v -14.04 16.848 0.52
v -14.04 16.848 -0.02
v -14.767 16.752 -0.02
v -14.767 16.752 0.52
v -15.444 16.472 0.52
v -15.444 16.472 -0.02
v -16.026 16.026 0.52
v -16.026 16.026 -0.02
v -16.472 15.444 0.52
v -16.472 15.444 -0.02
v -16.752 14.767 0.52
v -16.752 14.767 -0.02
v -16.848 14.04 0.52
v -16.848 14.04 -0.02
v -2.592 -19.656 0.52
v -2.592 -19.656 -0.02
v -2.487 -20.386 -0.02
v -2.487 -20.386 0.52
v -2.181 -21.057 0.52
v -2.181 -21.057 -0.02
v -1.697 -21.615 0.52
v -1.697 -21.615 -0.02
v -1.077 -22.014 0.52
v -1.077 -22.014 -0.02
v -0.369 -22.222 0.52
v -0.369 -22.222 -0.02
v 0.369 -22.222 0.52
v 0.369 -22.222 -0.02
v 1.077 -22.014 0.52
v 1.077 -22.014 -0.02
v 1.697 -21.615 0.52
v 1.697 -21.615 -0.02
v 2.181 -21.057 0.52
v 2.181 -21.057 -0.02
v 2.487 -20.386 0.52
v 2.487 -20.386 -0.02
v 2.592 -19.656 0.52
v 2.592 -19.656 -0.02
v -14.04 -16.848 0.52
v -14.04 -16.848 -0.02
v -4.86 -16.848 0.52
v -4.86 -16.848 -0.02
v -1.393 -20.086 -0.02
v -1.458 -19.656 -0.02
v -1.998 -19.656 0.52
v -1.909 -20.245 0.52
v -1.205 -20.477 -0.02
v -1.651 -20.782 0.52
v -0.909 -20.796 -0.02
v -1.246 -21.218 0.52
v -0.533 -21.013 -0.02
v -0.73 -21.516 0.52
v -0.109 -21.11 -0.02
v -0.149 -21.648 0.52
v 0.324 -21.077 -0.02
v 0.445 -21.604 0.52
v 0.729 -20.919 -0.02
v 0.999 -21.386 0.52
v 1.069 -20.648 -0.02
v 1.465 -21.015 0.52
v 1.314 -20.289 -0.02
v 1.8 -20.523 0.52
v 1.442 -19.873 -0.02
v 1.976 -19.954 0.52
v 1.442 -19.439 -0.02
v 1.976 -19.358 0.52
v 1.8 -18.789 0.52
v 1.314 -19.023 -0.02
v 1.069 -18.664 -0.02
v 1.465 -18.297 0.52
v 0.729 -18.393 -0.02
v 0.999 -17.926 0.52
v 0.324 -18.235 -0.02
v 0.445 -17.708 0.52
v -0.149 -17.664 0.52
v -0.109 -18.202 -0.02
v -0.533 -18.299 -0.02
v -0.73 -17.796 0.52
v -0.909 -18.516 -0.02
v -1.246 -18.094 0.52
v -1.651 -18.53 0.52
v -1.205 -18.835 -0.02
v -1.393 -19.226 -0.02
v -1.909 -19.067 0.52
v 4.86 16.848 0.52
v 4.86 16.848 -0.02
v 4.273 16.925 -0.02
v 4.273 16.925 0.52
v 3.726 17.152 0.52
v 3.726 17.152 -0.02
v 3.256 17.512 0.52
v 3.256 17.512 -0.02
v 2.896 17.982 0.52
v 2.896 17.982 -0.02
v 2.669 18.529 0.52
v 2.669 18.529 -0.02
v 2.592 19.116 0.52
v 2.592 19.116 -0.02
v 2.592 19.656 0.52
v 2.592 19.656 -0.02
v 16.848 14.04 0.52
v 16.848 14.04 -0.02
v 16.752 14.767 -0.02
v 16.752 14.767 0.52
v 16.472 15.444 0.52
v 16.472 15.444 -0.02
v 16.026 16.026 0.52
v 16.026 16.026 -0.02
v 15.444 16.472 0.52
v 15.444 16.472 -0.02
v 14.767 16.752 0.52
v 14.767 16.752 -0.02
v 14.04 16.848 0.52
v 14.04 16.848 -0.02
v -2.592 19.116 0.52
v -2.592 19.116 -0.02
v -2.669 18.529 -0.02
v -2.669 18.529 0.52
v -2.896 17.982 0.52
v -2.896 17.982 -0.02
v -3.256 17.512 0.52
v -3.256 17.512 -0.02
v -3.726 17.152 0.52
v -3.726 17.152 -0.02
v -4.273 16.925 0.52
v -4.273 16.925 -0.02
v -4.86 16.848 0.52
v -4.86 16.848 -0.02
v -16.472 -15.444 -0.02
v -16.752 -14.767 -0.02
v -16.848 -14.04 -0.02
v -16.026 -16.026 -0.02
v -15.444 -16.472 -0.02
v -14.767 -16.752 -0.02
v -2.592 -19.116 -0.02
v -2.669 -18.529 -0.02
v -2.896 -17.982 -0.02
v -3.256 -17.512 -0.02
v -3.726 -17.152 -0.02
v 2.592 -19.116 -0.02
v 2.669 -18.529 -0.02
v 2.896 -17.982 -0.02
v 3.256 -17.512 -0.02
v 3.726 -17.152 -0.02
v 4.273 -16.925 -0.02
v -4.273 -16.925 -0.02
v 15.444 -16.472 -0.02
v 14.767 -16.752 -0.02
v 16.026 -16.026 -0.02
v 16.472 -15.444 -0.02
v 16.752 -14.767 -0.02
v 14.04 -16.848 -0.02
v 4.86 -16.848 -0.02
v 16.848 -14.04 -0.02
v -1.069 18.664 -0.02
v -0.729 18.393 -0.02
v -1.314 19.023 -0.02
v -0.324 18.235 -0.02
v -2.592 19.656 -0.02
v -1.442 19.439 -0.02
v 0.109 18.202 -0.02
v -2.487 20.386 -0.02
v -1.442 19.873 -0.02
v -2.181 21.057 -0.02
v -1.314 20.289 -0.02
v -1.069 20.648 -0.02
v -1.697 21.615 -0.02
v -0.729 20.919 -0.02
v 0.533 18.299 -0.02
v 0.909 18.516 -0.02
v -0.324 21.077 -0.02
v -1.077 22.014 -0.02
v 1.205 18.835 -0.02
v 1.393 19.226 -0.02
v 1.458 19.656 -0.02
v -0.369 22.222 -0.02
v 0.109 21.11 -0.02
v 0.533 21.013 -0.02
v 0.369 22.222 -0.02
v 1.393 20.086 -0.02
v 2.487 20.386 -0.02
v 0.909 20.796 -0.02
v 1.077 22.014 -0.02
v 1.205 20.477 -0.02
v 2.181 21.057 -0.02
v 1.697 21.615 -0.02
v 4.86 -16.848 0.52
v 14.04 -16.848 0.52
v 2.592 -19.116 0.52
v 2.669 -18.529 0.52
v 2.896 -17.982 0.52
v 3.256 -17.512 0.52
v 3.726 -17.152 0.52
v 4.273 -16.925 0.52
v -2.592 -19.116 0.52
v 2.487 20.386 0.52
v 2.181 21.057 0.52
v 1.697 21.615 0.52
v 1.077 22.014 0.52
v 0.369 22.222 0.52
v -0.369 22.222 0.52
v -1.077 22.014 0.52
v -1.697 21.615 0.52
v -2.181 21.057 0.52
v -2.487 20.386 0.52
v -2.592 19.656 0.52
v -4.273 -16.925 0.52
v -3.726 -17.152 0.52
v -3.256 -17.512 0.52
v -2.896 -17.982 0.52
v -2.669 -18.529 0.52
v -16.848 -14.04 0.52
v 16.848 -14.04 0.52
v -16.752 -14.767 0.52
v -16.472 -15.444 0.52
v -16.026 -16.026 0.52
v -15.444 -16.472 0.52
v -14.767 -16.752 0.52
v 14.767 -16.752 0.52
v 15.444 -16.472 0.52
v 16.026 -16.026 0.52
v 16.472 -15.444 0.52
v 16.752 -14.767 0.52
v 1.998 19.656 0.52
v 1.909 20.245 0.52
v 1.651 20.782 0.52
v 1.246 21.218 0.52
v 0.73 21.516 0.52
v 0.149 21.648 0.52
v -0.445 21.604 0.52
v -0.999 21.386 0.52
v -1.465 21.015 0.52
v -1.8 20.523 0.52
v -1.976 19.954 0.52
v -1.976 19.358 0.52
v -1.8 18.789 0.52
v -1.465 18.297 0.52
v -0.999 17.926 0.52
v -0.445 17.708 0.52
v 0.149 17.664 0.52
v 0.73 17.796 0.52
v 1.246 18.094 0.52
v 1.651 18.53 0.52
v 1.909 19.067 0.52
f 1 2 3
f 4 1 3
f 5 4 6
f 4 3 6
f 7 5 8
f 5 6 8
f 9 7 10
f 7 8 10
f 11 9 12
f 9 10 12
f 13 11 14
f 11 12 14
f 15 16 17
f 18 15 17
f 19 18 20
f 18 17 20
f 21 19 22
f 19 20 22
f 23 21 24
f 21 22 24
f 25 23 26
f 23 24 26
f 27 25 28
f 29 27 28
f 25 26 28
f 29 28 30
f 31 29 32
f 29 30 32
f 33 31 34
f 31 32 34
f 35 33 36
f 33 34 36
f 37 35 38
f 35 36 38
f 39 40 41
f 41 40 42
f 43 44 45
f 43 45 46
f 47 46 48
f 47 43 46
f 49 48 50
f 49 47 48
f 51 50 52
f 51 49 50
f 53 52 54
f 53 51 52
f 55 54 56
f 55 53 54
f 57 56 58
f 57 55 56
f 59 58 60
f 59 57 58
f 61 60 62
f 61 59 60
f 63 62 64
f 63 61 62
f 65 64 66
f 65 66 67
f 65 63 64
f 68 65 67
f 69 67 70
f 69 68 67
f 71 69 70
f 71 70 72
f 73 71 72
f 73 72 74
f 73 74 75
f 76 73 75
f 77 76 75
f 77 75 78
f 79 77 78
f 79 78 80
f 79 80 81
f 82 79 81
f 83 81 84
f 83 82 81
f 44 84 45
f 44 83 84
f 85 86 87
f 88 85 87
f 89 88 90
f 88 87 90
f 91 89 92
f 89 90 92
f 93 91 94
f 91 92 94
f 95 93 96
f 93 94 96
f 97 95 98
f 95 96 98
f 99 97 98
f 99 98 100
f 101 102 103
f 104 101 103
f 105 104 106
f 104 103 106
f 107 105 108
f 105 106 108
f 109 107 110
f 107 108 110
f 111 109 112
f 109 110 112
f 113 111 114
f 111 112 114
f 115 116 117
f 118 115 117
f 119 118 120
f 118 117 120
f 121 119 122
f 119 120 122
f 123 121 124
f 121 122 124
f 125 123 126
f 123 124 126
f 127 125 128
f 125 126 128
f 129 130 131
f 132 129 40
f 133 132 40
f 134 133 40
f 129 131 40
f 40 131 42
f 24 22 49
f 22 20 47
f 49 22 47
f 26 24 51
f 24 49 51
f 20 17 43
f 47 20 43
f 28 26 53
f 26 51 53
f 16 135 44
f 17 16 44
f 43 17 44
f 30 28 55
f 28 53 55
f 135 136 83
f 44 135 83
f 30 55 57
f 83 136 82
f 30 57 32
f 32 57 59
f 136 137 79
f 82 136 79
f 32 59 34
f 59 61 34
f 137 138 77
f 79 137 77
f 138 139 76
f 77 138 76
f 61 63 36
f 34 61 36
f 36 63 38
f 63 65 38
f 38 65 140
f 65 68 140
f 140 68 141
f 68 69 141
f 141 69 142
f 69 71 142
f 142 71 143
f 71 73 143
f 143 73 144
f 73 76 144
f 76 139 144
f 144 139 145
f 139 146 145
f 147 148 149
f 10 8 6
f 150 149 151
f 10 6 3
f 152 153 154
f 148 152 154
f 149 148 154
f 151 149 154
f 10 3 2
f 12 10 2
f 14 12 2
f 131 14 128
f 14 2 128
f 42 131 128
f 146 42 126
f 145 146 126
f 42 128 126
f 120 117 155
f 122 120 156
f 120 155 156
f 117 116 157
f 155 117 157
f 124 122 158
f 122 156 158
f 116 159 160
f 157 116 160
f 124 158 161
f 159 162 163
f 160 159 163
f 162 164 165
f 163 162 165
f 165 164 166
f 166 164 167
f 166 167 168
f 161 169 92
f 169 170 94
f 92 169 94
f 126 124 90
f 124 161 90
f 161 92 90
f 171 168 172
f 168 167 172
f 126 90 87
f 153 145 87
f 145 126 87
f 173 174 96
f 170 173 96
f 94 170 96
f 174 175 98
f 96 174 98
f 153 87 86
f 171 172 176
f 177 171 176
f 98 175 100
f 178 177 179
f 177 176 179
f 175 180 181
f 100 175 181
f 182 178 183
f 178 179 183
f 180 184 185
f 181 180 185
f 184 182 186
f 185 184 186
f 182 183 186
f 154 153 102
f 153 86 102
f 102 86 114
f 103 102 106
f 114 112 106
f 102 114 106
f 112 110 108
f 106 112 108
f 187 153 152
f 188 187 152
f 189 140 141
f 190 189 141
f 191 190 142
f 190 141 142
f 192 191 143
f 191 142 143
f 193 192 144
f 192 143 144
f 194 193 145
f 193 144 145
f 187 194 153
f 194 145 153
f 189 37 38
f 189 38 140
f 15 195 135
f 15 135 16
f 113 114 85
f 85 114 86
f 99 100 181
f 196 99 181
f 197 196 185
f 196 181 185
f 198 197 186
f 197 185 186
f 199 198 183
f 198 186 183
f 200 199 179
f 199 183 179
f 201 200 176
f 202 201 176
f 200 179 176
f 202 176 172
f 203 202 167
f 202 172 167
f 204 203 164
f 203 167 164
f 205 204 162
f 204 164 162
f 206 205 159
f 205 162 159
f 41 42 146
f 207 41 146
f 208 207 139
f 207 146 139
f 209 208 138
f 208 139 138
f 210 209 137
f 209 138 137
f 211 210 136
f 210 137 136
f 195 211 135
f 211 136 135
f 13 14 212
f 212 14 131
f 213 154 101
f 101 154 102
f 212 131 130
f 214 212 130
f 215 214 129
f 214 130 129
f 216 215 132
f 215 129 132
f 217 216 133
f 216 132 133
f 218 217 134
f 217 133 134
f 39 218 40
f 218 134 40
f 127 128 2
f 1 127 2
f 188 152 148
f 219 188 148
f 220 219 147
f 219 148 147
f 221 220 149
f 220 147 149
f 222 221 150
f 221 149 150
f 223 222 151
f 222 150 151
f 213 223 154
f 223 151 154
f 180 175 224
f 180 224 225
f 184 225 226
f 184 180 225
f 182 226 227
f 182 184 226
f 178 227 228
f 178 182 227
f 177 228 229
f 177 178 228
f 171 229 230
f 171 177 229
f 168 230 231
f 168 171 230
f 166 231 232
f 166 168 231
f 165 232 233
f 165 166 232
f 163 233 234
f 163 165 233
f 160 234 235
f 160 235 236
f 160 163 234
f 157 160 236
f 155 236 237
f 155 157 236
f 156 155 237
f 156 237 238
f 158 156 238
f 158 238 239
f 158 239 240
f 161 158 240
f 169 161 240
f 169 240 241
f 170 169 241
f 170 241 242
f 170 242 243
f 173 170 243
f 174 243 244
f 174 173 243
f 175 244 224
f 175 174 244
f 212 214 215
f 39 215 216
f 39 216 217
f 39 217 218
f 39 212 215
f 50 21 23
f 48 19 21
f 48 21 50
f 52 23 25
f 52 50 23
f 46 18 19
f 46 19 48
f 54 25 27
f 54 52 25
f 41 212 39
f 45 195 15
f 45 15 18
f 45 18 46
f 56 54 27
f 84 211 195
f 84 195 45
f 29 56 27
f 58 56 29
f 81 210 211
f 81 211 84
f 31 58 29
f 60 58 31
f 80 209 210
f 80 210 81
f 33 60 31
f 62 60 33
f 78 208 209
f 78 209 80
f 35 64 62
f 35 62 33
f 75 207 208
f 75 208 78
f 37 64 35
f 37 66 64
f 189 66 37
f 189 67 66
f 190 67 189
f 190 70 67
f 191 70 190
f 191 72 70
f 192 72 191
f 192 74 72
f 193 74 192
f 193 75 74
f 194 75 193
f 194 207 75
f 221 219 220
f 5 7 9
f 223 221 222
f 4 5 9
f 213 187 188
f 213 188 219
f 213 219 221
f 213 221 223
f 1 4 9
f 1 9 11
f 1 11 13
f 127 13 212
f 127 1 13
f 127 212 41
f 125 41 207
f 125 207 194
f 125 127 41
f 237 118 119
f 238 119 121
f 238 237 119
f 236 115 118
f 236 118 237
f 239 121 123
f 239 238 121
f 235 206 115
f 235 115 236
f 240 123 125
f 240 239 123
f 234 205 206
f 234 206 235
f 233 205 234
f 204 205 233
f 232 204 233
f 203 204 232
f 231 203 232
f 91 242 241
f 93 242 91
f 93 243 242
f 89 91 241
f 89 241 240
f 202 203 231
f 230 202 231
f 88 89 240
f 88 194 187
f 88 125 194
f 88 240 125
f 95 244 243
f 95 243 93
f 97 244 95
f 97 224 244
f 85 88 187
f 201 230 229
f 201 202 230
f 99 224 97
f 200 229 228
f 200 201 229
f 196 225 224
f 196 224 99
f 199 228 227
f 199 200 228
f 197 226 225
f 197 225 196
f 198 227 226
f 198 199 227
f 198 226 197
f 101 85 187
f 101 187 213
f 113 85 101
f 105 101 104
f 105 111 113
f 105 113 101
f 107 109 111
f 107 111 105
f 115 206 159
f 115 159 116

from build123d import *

# Parameters (mm, degrees)
SKETCH_1_R      = 1
EXTRUDE_1_DEPTH = 0.5
CHAMFER_1_SIZE  = 0.85
SCALE_1_SCALE   = 1.08


with BuildPart() as part:
    # Эскиз1 → Бобышка-Вытянуть1 (new body)
    with BuildSketch(Plane.XY):
        with BuildLine():
            Line((-15.6, 13), (-15.6, -13))
            ThreePointArc((-15.6, -13), (-14.838477631, -14.838477631), (-13, -15.6))
            Line((-13, -15.6), (-12.5, -15.6))
            Line((-12.5, -15.6), (-4.5, -15.6))
            ThreePointArc((-4.5, -15.6), (-3.01507576, -16.21507576), (-2.4, -17.7))
            Line((-2.4, -17.7), (-2.4, -18.2))
            ThreePointArc((-2.4, -18.2), (0, -20.6), (2.4, -18.2))
            Line((2.4, -18.2), (2.4, -17.7))
            ThreePointArc((2.4, -17.7), (3.01507576, -16.21507576), (4.5, -15.6))
            Line((4.5, -15.6), (12.5, -15.6))
            Line((12.5, -15.6), (13, -15.6))
            ThreePointArc((13, -15.6), (14.838477631, -14.838477631), (15.6, -13))
            Line((15.6, -13), (15.6, 13))
            ThreePointArc((15.6, 13), (14.838477631, 14.838477631), (13, 15.6))
            Line((13, 15.6), (12.5, 15.6))
            Line((12.5, 15.6), (4.5, 15.6))
            ThreePointArc((4.5, 15.6), (3.01507576, 16.21507576), (2.4, 17.7))
            Line((2.4, 17.7), (2.4, 18.2))
            ThreePointArc((2.4, 18.2), (0, 20.6), (-2.4, 18.2))
            Line((-2.4, 18.2), (-2.4, 17.7))
            ThreePointArc((-2.4, 17.7), (-3.01507576, 16.21507576), (-4.5, 15.6))
            Line((-4.5, 15.6), (-12.5, 15.6))
            Line((-12.5, 15.6), (-13, 15.6))
            ThreePointArc((-13, 15.6), (-14.838477631, 14.838477631), (-15.6, 13))
        make_face()
        with Locations((0, 18.2)):
            Circle(SKETCH_1_R, mode=Mode.SUBTRACT)
        with Locations(Location((0, -18.2, 0), (0, 0, 180))):
            Circle(SKETCH_1_R, mode=Mode.SUBTRACT)
    extrude(amount=EXTRUDE_1_DEPTH)

    # Фаска1
    # the kernel refuses this chamfer: 0.85 mm, written as the material it takes off along each edge
    with BuildSketch(Plane(origin=(0, -18.2, 0.5), x_dir=(-1, 0, 0), z_dir=(0, 1, 0))) as chamfer_1_piece_1:
        Polygon((1 + CHAMFER_1_SIZE, 0), (1, -CHAMFER_1_SIZE), (1, 0), align=None)
    revolve(axis=Axis((0, -18.2, 0.5), (0, 0, 1)), mode=Mode.SUBTRACT)
    with BuildSketch(Plane(origin=(0, 18.2, 0.5), x_dir=(1, 0, 0), z_dir=(0, -1, 0))) as chamfer_1_piece_2:
        Polygon((1 + CHAMFER_1_SIZE, 0), (1, -CHAMFER_1_SIZE), (1, 0), align=None)
    revolve(axis=Axis((0, 18.2, 0.5), (0, 0, 1)), mode=Mode.SUBTRACT)


with BuildPart() as part_1:
    # Масштаб1: scaled about (0, 0, 0.249580392)
    add(part.part.scale(SCALE_1_SCALE).moved(Location((0, 0, -0.019966431))))


solid = part_1.part
